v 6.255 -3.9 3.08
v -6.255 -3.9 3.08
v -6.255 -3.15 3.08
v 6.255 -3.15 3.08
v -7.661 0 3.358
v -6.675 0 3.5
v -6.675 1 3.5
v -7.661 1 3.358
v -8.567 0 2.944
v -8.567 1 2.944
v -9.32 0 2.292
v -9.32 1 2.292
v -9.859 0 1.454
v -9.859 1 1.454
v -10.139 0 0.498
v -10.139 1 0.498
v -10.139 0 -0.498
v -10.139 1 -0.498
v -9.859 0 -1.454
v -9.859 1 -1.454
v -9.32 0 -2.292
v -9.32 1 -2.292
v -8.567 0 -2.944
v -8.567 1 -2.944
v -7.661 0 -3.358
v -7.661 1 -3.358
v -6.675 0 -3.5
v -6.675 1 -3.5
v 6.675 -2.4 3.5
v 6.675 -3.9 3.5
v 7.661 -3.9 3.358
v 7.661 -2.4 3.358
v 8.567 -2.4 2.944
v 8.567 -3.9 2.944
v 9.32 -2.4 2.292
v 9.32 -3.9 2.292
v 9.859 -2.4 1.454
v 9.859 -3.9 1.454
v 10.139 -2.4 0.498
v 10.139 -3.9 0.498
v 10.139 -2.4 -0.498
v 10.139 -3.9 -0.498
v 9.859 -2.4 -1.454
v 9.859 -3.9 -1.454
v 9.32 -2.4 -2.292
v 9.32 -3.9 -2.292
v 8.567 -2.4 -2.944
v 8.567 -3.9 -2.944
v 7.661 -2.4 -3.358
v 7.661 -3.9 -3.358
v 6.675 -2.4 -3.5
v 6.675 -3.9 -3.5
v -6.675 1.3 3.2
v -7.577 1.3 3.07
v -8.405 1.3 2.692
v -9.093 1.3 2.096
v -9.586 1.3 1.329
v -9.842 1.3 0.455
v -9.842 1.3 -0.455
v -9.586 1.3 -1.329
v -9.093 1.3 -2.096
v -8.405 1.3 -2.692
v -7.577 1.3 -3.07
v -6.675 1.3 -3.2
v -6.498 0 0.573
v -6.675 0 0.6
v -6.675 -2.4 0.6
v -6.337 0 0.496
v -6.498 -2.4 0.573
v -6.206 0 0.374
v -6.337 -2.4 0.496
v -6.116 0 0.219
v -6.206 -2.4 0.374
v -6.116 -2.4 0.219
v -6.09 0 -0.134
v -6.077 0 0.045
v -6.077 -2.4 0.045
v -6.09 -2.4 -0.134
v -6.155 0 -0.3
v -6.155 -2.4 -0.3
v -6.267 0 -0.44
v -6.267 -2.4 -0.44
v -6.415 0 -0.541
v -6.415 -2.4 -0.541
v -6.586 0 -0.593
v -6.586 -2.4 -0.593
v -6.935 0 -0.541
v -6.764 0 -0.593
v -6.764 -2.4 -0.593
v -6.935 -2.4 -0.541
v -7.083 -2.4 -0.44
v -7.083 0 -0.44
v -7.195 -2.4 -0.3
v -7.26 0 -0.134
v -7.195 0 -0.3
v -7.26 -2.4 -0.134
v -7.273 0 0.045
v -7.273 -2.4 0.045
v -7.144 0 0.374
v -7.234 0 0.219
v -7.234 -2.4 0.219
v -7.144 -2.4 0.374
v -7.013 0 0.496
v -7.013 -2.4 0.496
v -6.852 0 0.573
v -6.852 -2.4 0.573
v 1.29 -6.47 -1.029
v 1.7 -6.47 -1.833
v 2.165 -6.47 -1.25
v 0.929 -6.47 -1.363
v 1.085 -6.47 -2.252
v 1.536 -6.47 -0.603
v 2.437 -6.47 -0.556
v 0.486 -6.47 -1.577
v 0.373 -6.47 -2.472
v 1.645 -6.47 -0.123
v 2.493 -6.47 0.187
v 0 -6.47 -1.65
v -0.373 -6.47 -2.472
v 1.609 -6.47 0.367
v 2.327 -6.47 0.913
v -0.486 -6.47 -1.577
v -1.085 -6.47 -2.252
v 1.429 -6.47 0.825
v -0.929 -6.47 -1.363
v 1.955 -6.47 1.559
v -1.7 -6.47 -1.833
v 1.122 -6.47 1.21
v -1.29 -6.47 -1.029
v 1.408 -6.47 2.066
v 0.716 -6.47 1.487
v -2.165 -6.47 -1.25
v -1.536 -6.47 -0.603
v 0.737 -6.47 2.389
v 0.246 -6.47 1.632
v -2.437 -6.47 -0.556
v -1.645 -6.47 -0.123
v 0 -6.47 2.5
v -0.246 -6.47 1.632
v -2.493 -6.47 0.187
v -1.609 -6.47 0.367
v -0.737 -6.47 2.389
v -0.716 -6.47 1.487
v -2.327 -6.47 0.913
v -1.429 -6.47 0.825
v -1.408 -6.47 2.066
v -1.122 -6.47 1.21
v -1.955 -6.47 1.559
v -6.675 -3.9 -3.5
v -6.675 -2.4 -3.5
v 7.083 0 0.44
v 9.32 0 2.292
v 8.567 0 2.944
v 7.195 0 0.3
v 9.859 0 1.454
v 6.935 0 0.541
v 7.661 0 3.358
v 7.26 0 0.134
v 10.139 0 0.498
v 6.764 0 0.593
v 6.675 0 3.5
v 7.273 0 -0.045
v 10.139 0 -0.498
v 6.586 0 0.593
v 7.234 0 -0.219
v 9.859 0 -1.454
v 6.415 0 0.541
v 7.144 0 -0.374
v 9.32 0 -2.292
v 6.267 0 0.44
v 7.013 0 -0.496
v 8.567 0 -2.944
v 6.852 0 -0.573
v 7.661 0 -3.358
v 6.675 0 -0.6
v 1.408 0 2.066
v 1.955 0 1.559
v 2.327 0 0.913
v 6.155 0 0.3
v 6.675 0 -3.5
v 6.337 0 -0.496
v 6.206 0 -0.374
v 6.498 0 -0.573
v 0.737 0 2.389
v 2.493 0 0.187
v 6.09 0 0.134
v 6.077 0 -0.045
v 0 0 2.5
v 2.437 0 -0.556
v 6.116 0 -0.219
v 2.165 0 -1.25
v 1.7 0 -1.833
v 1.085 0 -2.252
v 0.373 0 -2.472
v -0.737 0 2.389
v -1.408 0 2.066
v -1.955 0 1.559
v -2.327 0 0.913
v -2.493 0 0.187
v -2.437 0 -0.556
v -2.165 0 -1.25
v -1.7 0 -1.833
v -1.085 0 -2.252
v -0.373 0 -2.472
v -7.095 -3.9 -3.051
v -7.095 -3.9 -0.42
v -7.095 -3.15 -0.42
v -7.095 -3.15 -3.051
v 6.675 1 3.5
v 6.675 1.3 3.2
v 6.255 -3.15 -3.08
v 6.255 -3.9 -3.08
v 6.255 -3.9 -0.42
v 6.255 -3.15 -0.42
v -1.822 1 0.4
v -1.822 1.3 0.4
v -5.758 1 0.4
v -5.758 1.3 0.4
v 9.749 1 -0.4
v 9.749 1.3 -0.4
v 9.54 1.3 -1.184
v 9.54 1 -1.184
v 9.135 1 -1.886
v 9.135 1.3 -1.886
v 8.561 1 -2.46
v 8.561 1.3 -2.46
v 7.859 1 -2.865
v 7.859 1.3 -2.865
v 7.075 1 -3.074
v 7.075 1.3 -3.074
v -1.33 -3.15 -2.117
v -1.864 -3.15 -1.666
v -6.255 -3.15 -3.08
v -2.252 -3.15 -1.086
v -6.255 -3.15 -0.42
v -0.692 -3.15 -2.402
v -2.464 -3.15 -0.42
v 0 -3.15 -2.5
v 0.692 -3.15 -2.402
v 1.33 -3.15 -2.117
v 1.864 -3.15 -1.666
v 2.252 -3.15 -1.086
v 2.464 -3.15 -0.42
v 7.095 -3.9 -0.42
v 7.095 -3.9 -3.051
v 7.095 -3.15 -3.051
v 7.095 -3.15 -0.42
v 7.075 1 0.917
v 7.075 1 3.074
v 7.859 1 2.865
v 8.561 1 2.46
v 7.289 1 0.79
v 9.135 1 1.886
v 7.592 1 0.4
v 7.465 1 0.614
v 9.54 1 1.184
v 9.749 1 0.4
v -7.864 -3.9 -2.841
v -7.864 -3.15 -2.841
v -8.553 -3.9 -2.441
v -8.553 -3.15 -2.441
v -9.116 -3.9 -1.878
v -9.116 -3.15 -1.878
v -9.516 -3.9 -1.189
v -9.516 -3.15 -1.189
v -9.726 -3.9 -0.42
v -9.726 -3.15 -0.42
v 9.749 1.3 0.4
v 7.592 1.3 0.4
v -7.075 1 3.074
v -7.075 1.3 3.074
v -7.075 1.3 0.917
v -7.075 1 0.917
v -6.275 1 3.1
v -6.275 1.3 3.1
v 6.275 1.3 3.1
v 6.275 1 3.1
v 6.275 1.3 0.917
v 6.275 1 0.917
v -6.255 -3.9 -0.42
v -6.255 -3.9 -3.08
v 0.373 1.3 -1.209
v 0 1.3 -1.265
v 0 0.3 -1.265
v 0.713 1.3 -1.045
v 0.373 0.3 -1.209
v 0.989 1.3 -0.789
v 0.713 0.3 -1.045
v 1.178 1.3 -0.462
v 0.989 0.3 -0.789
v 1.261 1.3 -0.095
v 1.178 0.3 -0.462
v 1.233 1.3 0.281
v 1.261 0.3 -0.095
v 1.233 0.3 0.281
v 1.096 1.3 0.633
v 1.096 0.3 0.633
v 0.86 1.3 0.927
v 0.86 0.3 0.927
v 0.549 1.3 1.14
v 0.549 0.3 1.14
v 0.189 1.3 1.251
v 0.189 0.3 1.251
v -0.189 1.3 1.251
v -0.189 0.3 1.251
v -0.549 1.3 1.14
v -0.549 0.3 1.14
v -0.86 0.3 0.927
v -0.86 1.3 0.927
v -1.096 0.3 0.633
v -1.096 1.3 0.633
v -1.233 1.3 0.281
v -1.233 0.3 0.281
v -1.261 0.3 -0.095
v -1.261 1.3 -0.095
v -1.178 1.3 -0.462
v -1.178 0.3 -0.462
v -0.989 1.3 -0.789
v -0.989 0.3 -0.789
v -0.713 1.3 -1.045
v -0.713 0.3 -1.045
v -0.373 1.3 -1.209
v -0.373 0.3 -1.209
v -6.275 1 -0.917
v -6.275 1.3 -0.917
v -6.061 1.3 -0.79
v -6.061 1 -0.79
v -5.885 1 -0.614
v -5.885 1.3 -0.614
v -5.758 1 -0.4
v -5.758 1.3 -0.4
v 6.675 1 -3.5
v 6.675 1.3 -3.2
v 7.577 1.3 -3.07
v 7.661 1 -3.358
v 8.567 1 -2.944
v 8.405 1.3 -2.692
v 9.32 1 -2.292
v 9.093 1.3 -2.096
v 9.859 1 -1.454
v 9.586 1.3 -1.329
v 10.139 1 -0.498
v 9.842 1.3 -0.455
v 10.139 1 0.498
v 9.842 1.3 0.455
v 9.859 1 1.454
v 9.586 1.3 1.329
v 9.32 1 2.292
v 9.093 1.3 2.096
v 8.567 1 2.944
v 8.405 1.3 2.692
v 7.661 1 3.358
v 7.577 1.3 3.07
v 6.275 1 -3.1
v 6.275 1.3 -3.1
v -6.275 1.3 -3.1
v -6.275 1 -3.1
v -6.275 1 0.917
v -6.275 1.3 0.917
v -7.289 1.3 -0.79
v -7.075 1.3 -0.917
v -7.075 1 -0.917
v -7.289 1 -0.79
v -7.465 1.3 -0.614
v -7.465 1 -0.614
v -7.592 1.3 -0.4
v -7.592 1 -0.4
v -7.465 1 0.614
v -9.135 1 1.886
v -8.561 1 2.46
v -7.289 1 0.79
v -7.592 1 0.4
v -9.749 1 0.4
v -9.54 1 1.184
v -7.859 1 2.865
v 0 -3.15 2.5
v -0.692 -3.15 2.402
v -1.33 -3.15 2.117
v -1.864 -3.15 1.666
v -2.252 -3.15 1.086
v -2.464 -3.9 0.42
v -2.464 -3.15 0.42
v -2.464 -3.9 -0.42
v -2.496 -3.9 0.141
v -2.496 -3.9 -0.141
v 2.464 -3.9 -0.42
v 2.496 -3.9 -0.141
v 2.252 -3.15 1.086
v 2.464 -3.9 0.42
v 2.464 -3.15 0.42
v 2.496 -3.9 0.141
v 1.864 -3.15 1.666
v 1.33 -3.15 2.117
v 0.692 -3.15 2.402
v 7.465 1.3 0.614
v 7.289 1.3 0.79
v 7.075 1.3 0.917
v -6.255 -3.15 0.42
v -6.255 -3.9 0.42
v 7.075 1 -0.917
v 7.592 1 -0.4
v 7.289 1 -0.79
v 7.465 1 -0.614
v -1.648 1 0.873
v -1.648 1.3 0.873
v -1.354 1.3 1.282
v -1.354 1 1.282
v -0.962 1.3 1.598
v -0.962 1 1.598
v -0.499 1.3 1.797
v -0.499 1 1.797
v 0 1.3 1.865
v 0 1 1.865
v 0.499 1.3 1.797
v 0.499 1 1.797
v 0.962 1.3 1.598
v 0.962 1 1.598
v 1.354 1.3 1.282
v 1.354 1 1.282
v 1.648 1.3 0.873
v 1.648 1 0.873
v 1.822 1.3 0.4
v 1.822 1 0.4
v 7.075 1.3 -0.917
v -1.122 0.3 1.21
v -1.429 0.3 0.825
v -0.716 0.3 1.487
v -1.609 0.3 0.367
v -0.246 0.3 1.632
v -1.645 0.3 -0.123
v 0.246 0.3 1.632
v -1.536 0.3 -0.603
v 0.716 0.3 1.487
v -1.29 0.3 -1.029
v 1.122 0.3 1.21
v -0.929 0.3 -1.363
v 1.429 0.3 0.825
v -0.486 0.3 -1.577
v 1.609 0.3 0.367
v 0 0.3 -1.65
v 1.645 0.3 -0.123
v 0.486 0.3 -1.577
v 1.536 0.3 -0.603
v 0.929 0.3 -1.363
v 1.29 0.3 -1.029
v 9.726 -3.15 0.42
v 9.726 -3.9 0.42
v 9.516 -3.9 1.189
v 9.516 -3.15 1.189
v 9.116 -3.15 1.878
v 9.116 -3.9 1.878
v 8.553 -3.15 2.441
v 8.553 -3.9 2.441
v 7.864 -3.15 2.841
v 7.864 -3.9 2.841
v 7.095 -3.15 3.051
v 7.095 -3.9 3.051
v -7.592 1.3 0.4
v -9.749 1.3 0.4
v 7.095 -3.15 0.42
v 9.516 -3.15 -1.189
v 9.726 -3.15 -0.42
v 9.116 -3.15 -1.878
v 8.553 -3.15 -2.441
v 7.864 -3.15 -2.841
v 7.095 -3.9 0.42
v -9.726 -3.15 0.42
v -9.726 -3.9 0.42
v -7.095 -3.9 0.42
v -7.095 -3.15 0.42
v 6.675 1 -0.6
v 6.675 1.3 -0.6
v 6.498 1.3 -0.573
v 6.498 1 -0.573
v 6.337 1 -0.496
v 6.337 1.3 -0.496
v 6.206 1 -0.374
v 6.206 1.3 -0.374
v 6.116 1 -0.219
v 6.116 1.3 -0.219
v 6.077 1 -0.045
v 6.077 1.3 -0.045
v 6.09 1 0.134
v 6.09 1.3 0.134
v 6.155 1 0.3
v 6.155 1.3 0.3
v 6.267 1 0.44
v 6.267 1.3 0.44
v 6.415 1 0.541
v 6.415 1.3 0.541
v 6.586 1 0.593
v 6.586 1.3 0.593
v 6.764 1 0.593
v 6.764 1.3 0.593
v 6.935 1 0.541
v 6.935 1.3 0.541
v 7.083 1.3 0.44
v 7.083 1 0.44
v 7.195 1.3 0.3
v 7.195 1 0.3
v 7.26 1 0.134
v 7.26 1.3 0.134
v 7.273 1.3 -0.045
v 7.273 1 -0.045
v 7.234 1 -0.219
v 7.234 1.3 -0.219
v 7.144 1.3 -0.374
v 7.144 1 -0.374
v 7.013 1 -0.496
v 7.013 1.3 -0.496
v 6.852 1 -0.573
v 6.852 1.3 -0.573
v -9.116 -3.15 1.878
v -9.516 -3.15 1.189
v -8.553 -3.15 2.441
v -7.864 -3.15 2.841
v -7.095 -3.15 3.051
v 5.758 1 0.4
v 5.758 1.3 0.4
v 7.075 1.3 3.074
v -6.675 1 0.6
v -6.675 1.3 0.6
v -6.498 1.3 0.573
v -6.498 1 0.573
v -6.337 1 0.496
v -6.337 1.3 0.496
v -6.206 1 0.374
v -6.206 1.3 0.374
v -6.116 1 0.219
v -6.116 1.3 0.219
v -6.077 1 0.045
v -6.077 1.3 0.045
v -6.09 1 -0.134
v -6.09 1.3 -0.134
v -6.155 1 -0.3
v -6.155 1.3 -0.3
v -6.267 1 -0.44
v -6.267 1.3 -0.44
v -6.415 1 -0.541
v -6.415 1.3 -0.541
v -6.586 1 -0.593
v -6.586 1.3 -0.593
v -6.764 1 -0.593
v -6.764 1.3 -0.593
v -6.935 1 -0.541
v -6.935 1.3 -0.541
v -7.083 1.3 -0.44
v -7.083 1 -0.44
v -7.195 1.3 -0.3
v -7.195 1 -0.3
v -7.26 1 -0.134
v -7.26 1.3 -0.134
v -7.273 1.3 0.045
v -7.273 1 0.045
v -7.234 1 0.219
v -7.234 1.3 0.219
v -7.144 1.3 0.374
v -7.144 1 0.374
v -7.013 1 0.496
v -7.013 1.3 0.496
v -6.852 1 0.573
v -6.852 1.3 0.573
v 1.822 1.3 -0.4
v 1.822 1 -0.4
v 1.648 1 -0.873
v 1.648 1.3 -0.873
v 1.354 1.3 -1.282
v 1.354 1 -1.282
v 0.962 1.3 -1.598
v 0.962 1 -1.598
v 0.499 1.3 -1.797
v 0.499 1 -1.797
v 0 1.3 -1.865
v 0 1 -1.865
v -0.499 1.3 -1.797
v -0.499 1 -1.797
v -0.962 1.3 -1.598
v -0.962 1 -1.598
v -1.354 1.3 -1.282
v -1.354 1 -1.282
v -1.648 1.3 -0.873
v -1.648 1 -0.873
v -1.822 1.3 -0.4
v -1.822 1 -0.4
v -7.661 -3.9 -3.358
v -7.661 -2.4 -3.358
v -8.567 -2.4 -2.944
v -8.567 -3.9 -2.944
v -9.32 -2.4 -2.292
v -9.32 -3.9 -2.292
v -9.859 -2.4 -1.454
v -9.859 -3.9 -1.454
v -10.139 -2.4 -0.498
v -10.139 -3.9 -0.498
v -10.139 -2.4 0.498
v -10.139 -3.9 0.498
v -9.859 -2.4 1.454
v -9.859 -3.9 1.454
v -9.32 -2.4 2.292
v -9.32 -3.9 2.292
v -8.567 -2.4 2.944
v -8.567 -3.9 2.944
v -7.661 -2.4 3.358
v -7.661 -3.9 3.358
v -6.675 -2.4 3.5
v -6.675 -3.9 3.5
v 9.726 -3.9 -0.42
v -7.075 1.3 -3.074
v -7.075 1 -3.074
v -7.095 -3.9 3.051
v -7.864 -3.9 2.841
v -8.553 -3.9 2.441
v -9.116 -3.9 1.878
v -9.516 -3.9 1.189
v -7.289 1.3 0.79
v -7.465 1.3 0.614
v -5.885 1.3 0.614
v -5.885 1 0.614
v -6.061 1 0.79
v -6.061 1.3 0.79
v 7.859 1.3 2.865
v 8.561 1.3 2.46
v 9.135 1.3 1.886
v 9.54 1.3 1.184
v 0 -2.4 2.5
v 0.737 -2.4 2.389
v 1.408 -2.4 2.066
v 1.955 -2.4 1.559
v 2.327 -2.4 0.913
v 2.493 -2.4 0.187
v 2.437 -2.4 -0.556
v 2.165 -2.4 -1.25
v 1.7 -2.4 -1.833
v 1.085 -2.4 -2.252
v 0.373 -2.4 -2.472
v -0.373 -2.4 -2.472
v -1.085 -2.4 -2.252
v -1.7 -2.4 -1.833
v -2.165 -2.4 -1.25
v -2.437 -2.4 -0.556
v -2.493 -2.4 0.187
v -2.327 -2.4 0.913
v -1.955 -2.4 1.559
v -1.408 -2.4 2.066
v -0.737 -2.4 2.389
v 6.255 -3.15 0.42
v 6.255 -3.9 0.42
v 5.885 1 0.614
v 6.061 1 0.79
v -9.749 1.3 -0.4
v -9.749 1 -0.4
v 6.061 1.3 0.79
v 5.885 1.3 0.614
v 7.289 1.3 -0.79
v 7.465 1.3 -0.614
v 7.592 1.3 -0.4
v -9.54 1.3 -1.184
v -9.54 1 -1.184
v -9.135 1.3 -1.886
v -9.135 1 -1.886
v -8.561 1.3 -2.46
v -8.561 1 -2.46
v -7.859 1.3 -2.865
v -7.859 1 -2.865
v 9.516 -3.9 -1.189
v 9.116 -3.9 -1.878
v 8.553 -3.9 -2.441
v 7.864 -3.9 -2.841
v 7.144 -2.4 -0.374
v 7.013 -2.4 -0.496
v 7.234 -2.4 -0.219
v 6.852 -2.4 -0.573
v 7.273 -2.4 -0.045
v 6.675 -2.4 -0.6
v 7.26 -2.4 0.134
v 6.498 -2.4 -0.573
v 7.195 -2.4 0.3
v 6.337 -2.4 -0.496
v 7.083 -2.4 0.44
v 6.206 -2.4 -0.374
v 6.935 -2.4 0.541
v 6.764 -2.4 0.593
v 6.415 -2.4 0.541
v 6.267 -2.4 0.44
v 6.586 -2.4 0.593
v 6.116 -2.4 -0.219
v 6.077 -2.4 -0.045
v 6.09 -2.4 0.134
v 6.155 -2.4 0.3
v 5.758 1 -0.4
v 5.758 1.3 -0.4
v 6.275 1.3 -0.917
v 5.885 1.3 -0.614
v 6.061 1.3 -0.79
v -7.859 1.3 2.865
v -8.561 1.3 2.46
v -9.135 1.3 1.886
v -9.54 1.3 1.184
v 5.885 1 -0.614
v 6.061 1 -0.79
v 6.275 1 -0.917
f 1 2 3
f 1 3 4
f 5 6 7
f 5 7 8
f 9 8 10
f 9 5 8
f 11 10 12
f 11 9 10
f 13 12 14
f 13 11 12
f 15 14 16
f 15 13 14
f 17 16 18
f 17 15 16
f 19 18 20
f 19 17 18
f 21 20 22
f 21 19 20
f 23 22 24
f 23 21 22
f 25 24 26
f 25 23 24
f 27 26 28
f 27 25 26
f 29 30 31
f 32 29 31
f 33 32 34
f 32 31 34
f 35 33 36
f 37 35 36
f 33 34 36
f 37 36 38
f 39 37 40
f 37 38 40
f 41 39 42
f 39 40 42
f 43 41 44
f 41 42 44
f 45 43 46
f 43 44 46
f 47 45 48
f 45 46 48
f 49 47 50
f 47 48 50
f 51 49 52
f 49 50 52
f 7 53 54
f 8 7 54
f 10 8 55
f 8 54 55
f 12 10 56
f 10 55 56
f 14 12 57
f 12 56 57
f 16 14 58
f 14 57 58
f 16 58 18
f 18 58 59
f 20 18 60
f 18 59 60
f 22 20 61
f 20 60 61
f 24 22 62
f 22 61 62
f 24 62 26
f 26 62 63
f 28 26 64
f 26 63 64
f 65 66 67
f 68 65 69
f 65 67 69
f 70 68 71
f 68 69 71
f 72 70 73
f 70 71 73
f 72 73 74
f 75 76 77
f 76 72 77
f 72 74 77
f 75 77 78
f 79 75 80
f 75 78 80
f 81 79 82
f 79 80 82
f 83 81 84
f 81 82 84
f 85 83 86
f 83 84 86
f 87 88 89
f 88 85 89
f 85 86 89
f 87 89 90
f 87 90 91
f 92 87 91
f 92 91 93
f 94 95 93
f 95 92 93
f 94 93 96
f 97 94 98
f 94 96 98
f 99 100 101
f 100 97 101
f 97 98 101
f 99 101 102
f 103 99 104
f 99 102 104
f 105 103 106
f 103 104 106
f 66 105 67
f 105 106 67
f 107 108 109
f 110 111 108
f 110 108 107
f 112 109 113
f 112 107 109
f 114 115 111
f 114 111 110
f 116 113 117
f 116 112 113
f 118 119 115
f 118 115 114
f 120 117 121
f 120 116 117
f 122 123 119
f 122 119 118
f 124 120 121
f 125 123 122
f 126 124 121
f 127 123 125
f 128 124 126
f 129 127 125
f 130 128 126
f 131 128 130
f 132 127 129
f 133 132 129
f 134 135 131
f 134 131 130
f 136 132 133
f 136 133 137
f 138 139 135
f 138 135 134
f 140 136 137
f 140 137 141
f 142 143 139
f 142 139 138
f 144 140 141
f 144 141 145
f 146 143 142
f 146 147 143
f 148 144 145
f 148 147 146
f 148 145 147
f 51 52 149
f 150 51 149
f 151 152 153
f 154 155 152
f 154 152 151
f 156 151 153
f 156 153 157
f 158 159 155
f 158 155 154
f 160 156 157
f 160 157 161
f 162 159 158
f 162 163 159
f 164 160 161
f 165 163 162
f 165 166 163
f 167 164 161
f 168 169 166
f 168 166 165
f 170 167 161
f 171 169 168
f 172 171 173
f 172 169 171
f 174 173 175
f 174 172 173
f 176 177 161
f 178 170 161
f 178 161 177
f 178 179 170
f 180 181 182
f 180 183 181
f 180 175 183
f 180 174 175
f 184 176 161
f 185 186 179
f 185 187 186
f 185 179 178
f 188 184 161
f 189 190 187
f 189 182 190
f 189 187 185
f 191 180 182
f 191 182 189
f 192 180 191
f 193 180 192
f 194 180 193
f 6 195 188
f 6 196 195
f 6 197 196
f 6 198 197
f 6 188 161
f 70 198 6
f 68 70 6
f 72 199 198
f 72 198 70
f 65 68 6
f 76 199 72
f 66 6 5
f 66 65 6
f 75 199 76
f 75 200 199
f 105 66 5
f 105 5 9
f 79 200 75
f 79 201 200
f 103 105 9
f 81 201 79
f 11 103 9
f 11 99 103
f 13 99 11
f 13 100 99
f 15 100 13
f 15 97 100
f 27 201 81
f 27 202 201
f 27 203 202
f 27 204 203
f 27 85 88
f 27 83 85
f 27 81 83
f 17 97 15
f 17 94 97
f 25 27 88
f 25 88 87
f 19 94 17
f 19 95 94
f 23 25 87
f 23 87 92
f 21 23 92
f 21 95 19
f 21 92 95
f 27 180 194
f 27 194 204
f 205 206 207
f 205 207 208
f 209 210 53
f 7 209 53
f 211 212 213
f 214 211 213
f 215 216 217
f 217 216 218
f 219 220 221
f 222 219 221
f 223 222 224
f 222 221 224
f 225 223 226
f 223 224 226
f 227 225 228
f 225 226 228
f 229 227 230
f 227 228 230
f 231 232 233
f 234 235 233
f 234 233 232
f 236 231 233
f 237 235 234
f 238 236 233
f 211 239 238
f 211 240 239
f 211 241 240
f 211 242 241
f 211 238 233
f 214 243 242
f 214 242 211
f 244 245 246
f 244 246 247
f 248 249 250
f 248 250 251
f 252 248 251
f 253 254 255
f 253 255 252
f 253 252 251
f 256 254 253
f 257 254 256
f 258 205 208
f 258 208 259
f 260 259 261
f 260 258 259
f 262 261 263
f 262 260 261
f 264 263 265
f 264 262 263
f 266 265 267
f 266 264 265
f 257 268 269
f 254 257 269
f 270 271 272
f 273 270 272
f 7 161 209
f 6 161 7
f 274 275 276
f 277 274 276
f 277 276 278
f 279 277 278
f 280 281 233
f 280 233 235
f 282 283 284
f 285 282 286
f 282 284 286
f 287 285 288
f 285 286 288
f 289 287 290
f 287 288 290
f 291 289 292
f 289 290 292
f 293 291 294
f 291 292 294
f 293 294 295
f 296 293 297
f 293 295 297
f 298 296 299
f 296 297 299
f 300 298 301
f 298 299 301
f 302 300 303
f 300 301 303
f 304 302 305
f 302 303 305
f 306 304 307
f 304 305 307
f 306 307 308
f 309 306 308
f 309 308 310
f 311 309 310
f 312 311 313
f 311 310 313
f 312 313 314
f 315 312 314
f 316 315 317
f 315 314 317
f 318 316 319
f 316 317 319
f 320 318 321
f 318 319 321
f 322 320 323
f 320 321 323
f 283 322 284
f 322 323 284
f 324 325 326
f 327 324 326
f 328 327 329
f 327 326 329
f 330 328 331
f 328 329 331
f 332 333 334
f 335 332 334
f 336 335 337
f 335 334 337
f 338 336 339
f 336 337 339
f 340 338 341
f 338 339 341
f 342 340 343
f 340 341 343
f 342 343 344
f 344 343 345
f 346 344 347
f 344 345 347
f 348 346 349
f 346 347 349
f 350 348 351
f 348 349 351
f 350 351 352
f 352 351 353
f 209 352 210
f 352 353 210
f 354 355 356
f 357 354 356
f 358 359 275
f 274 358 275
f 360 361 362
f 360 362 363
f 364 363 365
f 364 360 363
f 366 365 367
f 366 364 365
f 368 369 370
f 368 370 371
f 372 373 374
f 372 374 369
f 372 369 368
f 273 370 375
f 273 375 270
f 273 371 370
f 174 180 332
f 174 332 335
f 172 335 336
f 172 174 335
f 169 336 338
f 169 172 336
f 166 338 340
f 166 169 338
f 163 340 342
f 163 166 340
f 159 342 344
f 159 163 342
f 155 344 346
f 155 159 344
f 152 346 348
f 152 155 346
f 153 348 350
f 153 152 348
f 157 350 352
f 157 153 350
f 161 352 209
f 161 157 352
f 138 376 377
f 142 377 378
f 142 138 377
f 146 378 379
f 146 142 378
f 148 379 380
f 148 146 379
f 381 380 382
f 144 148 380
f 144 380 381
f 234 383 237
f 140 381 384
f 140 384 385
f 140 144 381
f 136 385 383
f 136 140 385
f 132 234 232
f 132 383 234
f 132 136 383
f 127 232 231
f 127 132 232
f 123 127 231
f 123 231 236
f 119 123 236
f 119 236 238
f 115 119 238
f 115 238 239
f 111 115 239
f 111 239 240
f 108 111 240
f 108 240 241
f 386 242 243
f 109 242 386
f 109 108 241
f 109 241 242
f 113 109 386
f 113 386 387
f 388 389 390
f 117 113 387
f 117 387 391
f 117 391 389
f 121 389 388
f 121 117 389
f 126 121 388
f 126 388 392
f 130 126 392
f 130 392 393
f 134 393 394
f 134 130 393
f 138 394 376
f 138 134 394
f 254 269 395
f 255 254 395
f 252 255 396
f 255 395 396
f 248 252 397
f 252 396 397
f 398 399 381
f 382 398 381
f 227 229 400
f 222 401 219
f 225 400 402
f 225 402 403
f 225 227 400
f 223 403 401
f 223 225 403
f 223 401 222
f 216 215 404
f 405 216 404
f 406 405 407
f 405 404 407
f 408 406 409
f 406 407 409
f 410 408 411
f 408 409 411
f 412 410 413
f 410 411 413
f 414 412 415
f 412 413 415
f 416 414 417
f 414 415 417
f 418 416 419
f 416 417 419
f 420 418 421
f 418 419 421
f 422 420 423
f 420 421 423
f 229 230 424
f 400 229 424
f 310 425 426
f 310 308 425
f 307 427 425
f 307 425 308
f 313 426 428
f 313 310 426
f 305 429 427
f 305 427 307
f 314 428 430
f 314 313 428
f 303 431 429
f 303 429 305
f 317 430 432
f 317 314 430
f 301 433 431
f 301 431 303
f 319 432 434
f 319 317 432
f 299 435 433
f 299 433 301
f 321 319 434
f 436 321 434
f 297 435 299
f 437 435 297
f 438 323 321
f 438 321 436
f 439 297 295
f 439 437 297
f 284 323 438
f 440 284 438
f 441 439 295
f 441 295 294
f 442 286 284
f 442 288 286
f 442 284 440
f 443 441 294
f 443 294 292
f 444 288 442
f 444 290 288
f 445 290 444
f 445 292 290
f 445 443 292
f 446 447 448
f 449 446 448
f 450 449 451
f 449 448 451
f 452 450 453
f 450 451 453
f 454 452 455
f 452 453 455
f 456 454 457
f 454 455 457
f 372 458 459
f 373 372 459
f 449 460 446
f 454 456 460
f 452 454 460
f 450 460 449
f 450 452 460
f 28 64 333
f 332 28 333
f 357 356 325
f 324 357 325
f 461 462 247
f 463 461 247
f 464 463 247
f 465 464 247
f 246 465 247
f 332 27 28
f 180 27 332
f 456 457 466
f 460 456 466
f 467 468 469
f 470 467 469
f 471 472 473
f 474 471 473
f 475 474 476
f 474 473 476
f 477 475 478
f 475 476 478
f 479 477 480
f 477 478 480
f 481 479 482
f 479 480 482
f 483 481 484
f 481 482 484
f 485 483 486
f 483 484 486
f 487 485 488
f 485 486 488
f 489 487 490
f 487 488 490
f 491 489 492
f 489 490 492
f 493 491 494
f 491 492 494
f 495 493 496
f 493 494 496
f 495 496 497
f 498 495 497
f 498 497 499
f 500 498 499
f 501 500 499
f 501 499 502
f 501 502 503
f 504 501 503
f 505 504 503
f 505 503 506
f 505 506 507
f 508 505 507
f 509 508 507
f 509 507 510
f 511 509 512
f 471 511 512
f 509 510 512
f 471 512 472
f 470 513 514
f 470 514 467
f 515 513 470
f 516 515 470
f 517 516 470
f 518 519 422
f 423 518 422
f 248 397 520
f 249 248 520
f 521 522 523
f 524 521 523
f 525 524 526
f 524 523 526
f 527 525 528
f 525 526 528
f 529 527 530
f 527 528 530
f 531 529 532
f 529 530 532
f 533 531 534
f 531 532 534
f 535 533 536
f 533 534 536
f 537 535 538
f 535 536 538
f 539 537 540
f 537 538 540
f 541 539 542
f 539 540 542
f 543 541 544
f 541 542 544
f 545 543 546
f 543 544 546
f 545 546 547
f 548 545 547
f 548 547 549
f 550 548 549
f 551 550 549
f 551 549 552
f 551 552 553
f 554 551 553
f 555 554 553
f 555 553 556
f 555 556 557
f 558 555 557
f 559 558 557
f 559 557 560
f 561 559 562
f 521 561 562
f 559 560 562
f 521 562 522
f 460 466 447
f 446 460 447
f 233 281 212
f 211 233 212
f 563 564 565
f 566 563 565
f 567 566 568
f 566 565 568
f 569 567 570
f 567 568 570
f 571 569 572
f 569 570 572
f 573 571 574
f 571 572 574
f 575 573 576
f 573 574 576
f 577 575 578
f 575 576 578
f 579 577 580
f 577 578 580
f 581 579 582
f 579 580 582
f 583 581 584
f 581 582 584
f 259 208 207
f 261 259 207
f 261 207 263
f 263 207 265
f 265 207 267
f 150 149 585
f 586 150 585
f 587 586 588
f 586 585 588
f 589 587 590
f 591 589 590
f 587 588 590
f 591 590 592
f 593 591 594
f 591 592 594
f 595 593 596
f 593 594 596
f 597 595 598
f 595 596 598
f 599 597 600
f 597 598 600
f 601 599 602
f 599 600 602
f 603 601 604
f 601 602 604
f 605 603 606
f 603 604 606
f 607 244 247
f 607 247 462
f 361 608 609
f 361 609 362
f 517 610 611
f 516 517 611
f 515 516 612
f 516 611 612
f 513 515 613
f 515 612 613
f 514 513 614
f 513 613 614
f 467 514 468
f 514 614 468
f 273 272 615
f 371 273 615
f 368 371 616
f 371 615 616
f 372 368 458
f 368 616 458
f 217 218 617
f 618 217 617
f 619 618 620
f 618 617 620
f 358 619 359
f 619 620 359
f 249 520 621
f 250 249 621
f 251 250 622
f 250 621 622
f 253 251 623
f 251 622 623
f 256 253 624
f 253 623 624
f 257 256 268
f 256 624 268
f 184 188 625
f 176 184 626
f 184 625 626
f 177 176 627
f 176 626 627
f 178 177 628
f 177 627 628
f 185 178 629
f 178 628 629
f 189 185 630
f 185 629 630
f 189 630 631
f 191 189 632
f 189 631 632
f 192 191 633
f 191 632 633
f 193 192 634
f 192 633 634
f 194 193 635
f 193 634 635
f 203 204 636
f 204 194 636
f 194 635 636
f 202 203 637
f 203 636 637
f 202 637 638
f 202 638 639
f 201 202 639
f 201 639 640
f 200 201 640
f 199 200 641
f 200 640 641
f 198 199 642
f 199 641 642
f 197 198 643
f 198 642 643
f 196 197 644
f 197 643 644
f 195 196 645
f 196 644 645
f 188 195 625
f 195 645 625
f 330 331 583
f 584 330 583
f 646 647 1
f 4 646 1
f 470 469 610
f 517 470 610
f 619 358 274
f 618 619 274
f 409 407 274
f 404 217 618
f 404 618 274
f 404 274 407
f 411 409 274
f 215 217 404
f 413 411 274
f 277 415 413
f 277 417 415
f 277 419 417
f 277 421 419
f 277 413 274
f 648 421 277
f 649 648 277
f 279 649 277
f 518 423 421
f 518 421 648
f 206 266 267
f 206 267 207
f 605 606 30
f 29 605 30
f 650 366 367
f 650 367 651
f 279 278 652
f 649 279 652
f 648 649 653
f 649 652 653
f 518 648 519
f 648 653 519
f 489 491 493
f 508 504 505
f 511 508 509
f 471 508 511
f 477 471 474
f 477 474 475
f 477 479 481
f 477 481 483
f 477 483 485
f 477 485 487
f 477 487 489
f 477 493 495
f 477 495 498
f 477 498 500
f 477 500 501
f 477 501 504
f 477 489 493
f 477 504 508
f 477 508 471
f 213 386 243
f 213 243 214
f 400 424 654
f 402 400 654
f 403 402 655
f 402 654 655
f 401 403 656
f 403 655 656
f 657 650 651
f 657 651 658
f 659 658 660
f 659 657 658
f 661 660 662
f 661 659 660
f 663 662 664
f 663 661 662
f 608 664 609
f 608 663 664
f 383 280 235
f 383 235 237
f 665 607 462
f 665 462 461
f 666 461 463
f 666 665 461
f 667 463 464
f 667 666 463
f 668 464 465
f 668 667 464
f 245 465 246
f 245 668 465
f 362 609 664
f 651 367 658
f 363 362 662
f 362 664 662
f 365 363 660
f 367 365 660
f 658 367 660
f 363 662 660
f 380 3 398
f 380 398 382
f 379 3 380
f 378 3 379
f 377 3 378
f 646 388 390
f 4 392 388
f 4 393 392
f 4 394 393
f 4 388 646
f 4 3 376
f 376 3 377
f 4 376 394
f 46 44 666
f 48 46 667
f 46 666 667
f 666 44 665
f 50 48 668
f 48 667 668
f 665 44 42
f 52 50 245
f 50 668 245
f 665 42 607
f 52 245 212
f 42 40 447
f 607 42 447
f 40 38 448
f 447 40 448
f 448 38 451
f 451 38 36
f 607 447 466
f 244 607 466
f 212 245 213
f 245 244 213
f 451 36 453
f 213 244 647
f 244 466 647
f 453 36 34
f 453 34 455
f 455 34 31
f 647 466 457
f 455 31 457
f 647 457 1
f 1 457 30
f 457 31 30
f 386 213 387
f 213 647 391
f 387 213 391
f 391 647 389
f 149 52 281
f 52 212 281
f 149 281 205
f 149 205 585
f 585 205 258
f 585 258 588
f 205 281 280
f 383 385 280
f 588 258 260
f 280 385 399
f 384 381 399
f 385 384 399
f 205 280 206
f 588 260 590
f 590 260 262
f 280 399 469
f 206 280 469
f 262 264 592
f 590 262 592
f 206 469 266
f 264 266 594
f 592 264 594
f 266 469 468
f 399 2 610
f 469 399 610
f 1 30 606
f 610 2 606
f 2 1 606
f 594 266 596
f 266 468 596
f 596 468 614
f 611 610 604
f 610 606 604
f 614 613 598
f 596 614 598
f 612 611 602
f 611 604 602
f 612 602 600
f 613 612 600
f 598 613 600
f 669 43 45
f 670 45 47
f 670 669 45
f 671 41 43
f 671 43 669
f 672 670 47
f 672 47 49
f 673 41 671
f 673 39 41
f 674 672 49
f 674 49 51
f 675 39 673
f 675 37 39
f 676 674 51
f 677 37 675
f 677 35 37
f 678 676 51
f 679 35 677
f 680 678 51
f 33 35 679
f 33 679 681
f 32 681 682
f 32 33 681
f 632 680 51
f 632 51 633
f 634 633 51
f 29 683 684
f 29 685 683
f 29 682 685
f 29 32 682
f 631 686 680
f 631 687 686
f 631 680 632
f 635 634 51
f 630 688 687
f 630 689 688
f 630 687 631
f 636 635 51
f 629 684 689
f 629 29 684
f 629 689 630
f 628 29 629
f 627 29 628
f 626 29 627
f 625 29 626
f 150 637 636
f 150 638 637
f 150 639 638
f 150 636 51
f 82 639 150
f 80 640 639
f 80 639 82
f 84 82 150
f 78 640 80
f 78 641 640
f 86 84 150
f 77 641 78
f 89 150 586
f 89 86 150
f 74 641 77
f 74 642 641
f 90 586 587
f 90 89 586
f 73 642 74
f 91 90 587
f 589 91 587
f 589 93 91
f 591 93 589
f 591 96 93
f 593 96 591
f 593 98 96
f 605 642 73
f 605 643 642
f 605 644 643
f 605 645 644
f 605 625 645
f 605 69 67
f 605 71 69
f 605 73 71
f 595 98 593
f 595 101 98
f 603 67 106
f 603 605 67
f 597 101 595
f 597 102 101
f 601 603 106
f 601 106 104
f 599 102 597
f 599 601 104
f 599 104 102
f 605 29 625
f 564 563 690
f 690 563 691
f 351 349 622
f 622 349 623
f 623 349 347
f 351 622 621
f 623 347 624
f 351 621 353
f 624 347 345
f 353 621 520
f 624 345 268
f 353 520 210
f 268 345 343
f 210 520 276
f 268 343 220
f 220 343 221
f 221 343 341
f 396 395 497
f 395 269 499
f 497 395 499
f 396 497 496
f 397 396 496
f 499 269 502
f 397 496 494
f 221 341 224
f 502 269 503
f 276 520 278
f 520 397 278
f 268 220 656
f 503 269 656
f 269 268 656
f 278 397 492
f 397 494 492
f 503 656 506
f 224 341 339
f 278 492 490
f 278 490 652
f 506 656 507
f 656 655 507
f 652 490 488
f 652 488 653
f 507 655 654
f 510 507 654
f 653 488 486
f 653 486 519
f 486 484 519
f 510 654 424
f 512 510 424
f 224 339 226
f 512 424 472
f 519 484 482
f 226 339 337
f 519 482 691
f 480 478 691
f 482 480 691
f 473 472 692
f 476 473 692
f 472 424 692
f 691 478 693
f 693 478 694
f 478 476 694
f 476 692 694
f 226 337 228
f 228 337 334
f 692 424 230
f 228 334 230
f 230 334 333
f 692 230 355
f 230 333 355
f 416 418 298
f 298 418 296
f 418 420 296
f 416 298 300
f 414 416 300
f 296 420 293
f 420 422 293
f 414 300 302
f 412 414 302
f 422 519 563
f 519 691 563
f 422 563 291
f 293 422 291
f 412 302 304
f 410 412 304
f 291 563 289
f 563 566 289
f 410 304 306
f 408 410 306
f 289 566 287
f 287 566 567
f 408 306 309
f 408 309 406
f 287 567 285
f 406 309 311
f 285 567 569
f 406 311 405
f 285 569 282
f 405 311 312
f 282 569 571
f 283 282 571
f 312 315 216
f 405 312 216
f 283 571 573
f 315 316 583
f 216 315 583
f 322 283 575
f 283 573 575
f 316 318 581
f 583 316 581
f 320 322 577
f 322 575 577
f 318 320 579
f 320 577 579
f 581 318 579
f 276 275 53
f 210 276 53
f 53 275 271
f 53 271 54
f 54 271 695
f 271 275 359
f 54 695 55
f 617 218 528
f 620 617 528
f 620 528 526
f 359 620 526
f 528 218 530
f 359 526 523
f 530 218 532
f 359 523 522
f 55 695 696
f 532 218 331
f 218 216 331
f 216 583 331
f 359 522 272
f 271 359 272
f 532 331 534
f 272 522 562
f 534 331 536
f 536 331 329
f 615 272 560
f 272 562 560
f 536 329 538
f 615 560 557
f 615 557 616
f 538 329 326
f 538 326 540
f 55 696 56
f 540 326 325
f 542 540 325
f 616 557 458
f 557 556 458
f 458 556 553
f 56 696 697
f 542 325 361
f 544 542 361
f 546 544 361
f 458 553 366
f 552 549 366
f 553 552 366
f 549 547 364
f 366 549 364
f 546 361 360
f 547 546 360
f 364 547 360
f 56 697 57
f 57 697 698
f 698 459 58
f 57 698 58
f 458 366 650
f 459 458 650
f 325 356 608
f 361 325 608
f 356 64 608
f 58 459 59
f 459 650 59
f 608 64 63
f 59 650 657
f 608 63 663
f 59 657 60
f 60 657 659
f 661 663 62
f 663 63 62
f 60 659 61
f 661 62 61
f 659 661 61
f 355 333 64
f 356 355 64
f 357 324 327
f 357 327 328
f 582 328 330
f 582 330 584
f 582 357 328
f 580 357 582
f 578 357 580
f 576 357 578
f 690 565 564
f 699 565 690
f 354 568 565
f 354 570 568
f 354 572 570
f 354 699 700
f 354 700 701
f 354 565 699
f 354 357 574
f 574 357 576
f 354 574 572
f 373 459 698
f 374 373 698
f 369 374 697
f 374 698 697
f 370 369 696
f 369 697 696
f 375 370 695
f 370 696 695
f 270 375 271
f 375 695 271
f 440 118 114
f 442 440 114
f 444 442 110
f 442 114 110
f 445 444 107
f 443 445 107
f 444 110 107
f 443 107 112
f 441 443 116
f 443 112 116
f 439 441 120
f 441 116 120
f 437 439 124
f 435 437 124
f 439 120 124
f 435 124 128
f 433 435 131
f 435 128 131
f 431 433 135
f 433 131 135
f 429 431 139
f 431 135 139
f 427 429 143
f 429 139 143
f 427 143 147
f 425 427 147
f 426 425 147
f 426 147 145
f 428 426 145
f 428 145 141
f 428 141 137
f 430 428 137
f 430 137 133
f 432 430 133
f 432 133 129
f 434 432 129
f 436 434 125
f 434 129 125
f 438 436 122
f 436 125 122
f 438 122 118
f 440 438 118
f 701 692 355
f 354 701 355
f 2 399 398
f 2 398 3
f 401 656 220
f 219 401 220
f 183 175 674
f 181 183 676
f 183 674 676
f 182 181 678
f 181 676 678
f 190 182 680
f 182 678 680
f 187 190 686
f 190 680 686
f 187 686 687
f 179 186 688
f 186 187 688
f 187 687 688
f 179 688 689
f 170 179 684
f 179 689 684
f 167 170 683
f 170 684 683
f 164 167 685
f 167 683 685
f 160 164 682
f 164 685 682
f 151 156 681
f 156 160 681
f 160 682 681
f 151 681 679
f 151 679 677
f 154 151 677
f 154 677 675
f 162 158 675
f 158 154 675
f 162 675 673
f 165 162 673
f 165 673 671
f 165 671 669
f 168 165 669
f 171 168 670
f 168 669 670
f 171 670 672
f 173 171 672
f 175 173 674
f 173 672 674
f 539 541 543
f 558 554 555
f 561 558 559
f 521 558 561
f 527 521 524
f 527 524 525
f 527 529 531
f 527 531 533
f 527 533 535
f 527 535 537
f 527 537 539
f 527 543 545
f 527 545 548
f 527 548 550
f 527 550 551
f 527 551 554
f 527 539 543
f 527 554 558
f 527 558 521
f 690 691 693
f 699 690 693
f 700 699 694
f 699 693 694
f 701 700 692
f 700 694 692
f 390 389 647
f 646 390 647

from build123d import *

# Parameters (mm, degrees)
SALIENTE_EXTRUIR1_DEPTH = 1.3
CROQUIS2_R              = 0.6
CORTAR_EXTRUIR1_DEPTH   = 0.3
CHAFL_N1_SIZE           = 0.3
SALIENTE_EXTRUIR2_REACH = 13.047
CROQUIS3_R              = 0.6
CROQUIS3_R_2            = 2.5
SALIENTE_EXTRUIR3_START = -1.2
CROQUIS4_R              = 0.6
CROQUIS4_R_2            = 2.5
SALIENTE_EXTRUIR3_DEPTH = 1.2
SALIENTE_EXTRUIR4_START = 1.5
SALIENTE_EXTRUIR4_DEPTH = 1.5
CROQUIS6_W              = 12.51
CROQUIS6_H              = 2.66
CORTAR_EXTRUIR3_DEPTH   = 0.75
SALIENTE_EXTRUIR5_START = 3.32
CROQUIS8_R              = 2.5
SALIENTE_EXTRUIR5_DEPTH = 3.32
CROQUIS9_R              = 1.65
CORTAR_EXTRUIR4_DEPTH   = 6.77
CROQUIS10_R             = 1.265
CORTAR_EXTRUIR6_DEPTH   = 6.77
CROQUIS12_R             = 1.865
CROQUIS12_R_2           = 1.265
SALIENTE_EXTRUIR6_DEPTH = 0.3


with BuildPart() as part:
    # Croquis1 → Saliente-Extruir1 (new body)
    with BuildSketch(Plane(origin=(0, 0, 0), x_dir=(1, 0, 0), z_dir=(0, 1, 0))):
        with BuildLine():
            Line((-6.675, 3.5), (6.675, 3.5))
            ThreePointArc((6.675, 3.5), (10.175, 0), (6.675, -3.5))
            Line((6.675, -3.5), (-6.675, -3.5))
            ThreePointArc((-6.675, -3.5), (-10.175, 0), (-6.675, 3.5))
        make_face()
    extrude(amount=SALIENTE_EXTRUIR1_DEPTH)

    # Croquis2 → Cortar-Extruir1 (cut)
    with BuildSketch(Plane(origin=(0, 1.3, 0), x_dir=(1, 0, 0), z_dir=(0, 1, 0))):
        with Locations(Location((-6.675, 0, 0), (0, 0, 270))):
            Circle(CROQUIS2_R)
        with Locations(Location((6.675, 0, 0), (0, 0, 90))):
            Circle(CROQUIS2_R)
        with BuildLine():
            Line((-7.075, 3.07408523), (-7.075, 0.916515139))
            ThreePointArc((-7.075, 0.916515139), (-7.382106781, 0.707106781), (-7.591515139, 0.4))
            Line((-7.591515139, 0.4), (-9.74908523, 0.4))
            ThreePointArc((-9.74908523, 0.4), (-8.867031022, 2.192031022), (-7.075, 3.07408523))
        make_face()
        with BuildLine():
            Line((-6.275, 3.1), (-6.275, 0.916515139))
            ThreePointArc((-6.275, 0.916515139), (-5.967893219, 0.707106781), (-5.758484861, 0.4))
            Line((-5.758484861, 0.4), (5.758484861, 0.4))
            ThreePointArc((5.758484861, 0.4), (5.967893219, 0.707106781), (6.275, 0.916515139))
            Line((6.275, 0.916515139), (6.275, 3.1))
            Line((6.275, 3.1), (-6.275, 3.1))
        make_face()
        with BuildLine():
            Line((-6.275, -0.916515139), (-6.275, -3.1))
            Line((-6.275, -3.1), (6.275, -3.1))
            Line((6.275, -3.1), (6.275, -0.916515139))
            ThreePointArc((6.275, -0.916515139), (5.967893219, -0.707106781), (5.758484861, -0.4))
            Line((5.758484861, -0.4), (-5.758484861, -0.4))
            ThreePointArc((-5.758484861, -0.4), (-5.967893219, -0.707106781), (-6.275, -0.916515139))
        make_face()
        with BuildLine():
            Line((-7.591515139, -0.4), (-9.74908523, -0.4))
            ThreePointArc((-9.74908523, -0.4), (-8.867031022, -2.192031022), (-7.075, -3.07408523))
            Line((-7.075, -3.07408523), (-7.075, -0.916515139))
            ThreePointArc((-7.075, -0.916515139), (-7.382106781, -0.707106781), (-7.591515139, -0.4))
        make_face()
        with BuildLine():
            Line((7.075, -0.916515139), (7.075, -3.07408523))
            ThreePointArc((7.075, -3.07408523), (8.867031022, -2.192031022), (9.74908523, -0.4))
            Line((9.74908523, -0.4), (7.591515139, -0.4))
            ThreePointArc((7.591515139, -0.4), (7.382106781, -0.707106781), (7.075, -0.916515139))
        make_face()
        with BuildLine():
            Line((7.591515139, 0.4), (9.74908523, 0.4))
            ThreePointArc((9.74908523, 0.4), (8.867031022, 2.192031022), (7.075, 3.07408523))
            Line((7.075, 3.07408523), (7.075, 0.916515139))
            ThreePointArc((7.075, 0.916515139), (7.382106781, 0.707106781), (7.591515139, 0.4))
        make_face()
    extrude(amount=-CORTAR_EXTRUIR1_DEPTH, mode=Mode.SUBTRACT)

    # Chaflán1
    chafl_n1_edges = [part.edges().sort_by_distance(p)[0] for p in [
        (10.175, 1.3, 0),
        (0, 1.3, -3.5),
        (-10.175, 1.3, 0),
        (0, 1.3, 3.5),
    ]]
    chamfer(chafl_n1_edges, length=CHAFL_N1_SIZE)

    # Croquis3 → Saliente-Extruir2 (add, up to next)
    with BuildSketch(Plane(origin=(0, -1.2, 0), x_dir=(1, 0, 0), z_dir=(0, 1, 0)), mode=Mode.PRIVATE) as saliente_extruir2_sk1:
        with Locations(Location((6.675, 0, 0), (0, 0, 90))):
            Circle(CROQUIS3_R)
    saliente_extruir2_tool1 = extrude(saliente_extruir2_sk1.sketch, amount=SALIENTE_EXTRUIR2_REACH, mode=Mode.PRIVATE) - part.part
    # Croquis3 → Saliente-Extruir2 (add, up to next)
    with BuildSketch(Plane(origin=(0, -1.2, 0), x_dir=(1, 0, 0), z_dir=(0, 1, 0)), mode=Mode.PRIVATE) as saliente_extruir2_sk2:
        with Locations(Location((-6.675, 0, 0), (0, 0, 270))):
            Circle(CROQUIS3_R)
    saliente_extruir2_tool2 = extrude(saliente_extruir2_sk2.sketch, amount=SALIENTE_EXTRUIR2_REACH, mode=Mode.PRIVATE) - part.part
    # Croquis3 → Saliente-Extruir2 (add, up to next)
    with BuildSketch(Plane(origin=(0, -1.2, 0), x_dir=(1, 0, 0), z_dir=(0, 1, 0)), mode=Mode.PRIVATE) as saliente_extruir2_sk3:
        with Locations(Location((0, 0, 0), (0, 0, 270))):
            Circle(CROQUIS3_R_2)
    saliente_extruir2_tool3 = extrude(saliente_extruir2_sk3.sketch, amount=SALIENTE_EXTRUIR2_REACH, mode=Mode.PRIVATE) - part.part
    add(saliente_extruir2_tool1.solids().sort_by_distance((6.675, -1.2, 0))[0])
    add(saliente_extruir2_tool2.solids().sort_by_distance((-6.675, -1.2, 0))[0])
    add(saliente_extruir2_tool3.solids().sort_by_distance((0, -1.2, 0))[0])

    # Croquis4 → Saliente-Extruir3 (add)
    with BuildSketch(Plane(origin=(0, -1.2, 0), x_dir=(1, 0, 0), z_dir=(0, 1, 0)).offset(SALIENTE_EXTRUIR3_START)):
        with Locations(Location((6.675, 0, 0), (0, 0, 90))):
            Circle(CROQUIS4_R)
        with Locations(Location((-6.675, 0, 0), (0, 0, 270))):
            Circle(CROQUIS4_R)
        with Locations(Location((0, 0, 0), (0, 0, 270))):
            Circle(CROQUIS4_R_2)
    extrude(amount=SALIENTE_EXTRUIR3_DEPTH)

    # Croquis5 → Saliente-Extruir4 (add)
    with BuildSketch(Plane.XZ.offset(2.4).offset(SALIENTE_EXTRUIR4_START)):
        with BuildLine():
            Line((6.675, -3.5), (-6.675, -3.5))
            ThreePointArc((-6.675, -3.5), (-10.175, 0), (-6.675, 3.5))
            Line((-6.675, 3.5), (6.675, 3.5))
            ThreePointArc((6.675, 3.5), (10.175, 0), (6.675, -3.5))
        make_face()
    extrude(amount=-SALIENTE_EXTRUIR4_DEPTH)

    # Croquis6 → Cortar-Extruir3 (cut)
    with BuildSketch(Plane.XZ.offset(3.9)):
        with Locations((0, 1.75)):
            Rectangle(CROQUIS6_W, CROQUIS6_H)
        with BuildLine():
            Line((-9.72622926, -0.42), (-7.095, -0.42))
            Line((-7.095, -0.42), (-7.095, -3.05122926))
            ThreePointArc((-7.095, -3.05122926), (-8.852888886, -2.177888886), (-9.72622926, -0.42))
        make_face()
        with Locations((0, -1.75)):
            Rectangle(CROQUIS6_W, CROQUIS6_H)
        with BuildLine():
            Line((7.095, -3.05122926), (7.095, -0.42))
            Line((7.095, -0.42), (9.72622926, -0.42))
            ThreePointArc((9.72622926, -0.42), (8.852888886, -2.177888886), (7.095, -3.05122926))
        make_face()
        with BuildLine():
            Line((-9.72622926, 0.42), (-7.095, 0.42))
            Line((-7.095, 0.42), (-7.095, 3.05122926))
            ThreePointArc((-7.095, 3.05122926), (-8.852888886, 2.177888886), (-9.72622926, 0.42))
        make_face()
        with BuildLine():
            Line((7.095, 0.42), (9.72622926, 0.42))
            ThreePointArc((9.72622926, 0.42), (8.852888886, 2.177888886), (7.095, 3.05122926))
            Line((7.095, 3.05122926), (7.095, 0.42))
        make_face()
    extrude(amount=-CORTAR_EXTRUIR3_DEPTH, mode=Mode.SUBTRACT)

    # Croquis8 → Saliente-Extruir5 (add)
    with BuildSketch(Plane.XZ.offset(3.15).offset(SALIENTE_EXTRUIR5_START)):
        with Locations(Location((0, 0, 0), (0, 0, 90))):
            Circle(CROQUIS8_R)
    extrude(amount=-SALIENTE_EXTRUIR5_DEPTH)

    # Croquis9 → Cortar-Extruir4 (cut)
    with BuildSketch(Plane.XZ.offset(6.47)):
        with Locations(Location((0, 0, 0), (0, 0, 270))):
            Circle(CROQUIS9_R)
    extrude(amount=-CORTAR_EXTRUIR4_DEPTH, mode=Mode.SUBTRACT)

    # Croquis10 → Cortar-Extruir6 (cut)
    with BuildSketch(Plane.XZ.offset(-0.3)):
        with Locations(Location((0, 0, 0), (0, 0, 270))):
            Circle(CROQUIS10_R)
    extrude(amount=-CORTAR_EXTRUIR6_DEPTH, mode=Mode.SUBTRACT)

    # Croquis12 → Saliente-Extruir6 (add)
    with BuildSketch(Plane(origin=(0, 1, 0), x_dir=(1, 0, 0), z_dir=(0, 1, 0))):
        Circle(CROQUIS12_R)
        with Locations(Location((0, 0, 0), (0, 0, 90))):
            Circle(CROQUIS12_R_2, mode=Mode.SUBTRACT)
    extrude(amount=SALIENTE_EXTRUIR6_DEPTH)


solid = part.part
